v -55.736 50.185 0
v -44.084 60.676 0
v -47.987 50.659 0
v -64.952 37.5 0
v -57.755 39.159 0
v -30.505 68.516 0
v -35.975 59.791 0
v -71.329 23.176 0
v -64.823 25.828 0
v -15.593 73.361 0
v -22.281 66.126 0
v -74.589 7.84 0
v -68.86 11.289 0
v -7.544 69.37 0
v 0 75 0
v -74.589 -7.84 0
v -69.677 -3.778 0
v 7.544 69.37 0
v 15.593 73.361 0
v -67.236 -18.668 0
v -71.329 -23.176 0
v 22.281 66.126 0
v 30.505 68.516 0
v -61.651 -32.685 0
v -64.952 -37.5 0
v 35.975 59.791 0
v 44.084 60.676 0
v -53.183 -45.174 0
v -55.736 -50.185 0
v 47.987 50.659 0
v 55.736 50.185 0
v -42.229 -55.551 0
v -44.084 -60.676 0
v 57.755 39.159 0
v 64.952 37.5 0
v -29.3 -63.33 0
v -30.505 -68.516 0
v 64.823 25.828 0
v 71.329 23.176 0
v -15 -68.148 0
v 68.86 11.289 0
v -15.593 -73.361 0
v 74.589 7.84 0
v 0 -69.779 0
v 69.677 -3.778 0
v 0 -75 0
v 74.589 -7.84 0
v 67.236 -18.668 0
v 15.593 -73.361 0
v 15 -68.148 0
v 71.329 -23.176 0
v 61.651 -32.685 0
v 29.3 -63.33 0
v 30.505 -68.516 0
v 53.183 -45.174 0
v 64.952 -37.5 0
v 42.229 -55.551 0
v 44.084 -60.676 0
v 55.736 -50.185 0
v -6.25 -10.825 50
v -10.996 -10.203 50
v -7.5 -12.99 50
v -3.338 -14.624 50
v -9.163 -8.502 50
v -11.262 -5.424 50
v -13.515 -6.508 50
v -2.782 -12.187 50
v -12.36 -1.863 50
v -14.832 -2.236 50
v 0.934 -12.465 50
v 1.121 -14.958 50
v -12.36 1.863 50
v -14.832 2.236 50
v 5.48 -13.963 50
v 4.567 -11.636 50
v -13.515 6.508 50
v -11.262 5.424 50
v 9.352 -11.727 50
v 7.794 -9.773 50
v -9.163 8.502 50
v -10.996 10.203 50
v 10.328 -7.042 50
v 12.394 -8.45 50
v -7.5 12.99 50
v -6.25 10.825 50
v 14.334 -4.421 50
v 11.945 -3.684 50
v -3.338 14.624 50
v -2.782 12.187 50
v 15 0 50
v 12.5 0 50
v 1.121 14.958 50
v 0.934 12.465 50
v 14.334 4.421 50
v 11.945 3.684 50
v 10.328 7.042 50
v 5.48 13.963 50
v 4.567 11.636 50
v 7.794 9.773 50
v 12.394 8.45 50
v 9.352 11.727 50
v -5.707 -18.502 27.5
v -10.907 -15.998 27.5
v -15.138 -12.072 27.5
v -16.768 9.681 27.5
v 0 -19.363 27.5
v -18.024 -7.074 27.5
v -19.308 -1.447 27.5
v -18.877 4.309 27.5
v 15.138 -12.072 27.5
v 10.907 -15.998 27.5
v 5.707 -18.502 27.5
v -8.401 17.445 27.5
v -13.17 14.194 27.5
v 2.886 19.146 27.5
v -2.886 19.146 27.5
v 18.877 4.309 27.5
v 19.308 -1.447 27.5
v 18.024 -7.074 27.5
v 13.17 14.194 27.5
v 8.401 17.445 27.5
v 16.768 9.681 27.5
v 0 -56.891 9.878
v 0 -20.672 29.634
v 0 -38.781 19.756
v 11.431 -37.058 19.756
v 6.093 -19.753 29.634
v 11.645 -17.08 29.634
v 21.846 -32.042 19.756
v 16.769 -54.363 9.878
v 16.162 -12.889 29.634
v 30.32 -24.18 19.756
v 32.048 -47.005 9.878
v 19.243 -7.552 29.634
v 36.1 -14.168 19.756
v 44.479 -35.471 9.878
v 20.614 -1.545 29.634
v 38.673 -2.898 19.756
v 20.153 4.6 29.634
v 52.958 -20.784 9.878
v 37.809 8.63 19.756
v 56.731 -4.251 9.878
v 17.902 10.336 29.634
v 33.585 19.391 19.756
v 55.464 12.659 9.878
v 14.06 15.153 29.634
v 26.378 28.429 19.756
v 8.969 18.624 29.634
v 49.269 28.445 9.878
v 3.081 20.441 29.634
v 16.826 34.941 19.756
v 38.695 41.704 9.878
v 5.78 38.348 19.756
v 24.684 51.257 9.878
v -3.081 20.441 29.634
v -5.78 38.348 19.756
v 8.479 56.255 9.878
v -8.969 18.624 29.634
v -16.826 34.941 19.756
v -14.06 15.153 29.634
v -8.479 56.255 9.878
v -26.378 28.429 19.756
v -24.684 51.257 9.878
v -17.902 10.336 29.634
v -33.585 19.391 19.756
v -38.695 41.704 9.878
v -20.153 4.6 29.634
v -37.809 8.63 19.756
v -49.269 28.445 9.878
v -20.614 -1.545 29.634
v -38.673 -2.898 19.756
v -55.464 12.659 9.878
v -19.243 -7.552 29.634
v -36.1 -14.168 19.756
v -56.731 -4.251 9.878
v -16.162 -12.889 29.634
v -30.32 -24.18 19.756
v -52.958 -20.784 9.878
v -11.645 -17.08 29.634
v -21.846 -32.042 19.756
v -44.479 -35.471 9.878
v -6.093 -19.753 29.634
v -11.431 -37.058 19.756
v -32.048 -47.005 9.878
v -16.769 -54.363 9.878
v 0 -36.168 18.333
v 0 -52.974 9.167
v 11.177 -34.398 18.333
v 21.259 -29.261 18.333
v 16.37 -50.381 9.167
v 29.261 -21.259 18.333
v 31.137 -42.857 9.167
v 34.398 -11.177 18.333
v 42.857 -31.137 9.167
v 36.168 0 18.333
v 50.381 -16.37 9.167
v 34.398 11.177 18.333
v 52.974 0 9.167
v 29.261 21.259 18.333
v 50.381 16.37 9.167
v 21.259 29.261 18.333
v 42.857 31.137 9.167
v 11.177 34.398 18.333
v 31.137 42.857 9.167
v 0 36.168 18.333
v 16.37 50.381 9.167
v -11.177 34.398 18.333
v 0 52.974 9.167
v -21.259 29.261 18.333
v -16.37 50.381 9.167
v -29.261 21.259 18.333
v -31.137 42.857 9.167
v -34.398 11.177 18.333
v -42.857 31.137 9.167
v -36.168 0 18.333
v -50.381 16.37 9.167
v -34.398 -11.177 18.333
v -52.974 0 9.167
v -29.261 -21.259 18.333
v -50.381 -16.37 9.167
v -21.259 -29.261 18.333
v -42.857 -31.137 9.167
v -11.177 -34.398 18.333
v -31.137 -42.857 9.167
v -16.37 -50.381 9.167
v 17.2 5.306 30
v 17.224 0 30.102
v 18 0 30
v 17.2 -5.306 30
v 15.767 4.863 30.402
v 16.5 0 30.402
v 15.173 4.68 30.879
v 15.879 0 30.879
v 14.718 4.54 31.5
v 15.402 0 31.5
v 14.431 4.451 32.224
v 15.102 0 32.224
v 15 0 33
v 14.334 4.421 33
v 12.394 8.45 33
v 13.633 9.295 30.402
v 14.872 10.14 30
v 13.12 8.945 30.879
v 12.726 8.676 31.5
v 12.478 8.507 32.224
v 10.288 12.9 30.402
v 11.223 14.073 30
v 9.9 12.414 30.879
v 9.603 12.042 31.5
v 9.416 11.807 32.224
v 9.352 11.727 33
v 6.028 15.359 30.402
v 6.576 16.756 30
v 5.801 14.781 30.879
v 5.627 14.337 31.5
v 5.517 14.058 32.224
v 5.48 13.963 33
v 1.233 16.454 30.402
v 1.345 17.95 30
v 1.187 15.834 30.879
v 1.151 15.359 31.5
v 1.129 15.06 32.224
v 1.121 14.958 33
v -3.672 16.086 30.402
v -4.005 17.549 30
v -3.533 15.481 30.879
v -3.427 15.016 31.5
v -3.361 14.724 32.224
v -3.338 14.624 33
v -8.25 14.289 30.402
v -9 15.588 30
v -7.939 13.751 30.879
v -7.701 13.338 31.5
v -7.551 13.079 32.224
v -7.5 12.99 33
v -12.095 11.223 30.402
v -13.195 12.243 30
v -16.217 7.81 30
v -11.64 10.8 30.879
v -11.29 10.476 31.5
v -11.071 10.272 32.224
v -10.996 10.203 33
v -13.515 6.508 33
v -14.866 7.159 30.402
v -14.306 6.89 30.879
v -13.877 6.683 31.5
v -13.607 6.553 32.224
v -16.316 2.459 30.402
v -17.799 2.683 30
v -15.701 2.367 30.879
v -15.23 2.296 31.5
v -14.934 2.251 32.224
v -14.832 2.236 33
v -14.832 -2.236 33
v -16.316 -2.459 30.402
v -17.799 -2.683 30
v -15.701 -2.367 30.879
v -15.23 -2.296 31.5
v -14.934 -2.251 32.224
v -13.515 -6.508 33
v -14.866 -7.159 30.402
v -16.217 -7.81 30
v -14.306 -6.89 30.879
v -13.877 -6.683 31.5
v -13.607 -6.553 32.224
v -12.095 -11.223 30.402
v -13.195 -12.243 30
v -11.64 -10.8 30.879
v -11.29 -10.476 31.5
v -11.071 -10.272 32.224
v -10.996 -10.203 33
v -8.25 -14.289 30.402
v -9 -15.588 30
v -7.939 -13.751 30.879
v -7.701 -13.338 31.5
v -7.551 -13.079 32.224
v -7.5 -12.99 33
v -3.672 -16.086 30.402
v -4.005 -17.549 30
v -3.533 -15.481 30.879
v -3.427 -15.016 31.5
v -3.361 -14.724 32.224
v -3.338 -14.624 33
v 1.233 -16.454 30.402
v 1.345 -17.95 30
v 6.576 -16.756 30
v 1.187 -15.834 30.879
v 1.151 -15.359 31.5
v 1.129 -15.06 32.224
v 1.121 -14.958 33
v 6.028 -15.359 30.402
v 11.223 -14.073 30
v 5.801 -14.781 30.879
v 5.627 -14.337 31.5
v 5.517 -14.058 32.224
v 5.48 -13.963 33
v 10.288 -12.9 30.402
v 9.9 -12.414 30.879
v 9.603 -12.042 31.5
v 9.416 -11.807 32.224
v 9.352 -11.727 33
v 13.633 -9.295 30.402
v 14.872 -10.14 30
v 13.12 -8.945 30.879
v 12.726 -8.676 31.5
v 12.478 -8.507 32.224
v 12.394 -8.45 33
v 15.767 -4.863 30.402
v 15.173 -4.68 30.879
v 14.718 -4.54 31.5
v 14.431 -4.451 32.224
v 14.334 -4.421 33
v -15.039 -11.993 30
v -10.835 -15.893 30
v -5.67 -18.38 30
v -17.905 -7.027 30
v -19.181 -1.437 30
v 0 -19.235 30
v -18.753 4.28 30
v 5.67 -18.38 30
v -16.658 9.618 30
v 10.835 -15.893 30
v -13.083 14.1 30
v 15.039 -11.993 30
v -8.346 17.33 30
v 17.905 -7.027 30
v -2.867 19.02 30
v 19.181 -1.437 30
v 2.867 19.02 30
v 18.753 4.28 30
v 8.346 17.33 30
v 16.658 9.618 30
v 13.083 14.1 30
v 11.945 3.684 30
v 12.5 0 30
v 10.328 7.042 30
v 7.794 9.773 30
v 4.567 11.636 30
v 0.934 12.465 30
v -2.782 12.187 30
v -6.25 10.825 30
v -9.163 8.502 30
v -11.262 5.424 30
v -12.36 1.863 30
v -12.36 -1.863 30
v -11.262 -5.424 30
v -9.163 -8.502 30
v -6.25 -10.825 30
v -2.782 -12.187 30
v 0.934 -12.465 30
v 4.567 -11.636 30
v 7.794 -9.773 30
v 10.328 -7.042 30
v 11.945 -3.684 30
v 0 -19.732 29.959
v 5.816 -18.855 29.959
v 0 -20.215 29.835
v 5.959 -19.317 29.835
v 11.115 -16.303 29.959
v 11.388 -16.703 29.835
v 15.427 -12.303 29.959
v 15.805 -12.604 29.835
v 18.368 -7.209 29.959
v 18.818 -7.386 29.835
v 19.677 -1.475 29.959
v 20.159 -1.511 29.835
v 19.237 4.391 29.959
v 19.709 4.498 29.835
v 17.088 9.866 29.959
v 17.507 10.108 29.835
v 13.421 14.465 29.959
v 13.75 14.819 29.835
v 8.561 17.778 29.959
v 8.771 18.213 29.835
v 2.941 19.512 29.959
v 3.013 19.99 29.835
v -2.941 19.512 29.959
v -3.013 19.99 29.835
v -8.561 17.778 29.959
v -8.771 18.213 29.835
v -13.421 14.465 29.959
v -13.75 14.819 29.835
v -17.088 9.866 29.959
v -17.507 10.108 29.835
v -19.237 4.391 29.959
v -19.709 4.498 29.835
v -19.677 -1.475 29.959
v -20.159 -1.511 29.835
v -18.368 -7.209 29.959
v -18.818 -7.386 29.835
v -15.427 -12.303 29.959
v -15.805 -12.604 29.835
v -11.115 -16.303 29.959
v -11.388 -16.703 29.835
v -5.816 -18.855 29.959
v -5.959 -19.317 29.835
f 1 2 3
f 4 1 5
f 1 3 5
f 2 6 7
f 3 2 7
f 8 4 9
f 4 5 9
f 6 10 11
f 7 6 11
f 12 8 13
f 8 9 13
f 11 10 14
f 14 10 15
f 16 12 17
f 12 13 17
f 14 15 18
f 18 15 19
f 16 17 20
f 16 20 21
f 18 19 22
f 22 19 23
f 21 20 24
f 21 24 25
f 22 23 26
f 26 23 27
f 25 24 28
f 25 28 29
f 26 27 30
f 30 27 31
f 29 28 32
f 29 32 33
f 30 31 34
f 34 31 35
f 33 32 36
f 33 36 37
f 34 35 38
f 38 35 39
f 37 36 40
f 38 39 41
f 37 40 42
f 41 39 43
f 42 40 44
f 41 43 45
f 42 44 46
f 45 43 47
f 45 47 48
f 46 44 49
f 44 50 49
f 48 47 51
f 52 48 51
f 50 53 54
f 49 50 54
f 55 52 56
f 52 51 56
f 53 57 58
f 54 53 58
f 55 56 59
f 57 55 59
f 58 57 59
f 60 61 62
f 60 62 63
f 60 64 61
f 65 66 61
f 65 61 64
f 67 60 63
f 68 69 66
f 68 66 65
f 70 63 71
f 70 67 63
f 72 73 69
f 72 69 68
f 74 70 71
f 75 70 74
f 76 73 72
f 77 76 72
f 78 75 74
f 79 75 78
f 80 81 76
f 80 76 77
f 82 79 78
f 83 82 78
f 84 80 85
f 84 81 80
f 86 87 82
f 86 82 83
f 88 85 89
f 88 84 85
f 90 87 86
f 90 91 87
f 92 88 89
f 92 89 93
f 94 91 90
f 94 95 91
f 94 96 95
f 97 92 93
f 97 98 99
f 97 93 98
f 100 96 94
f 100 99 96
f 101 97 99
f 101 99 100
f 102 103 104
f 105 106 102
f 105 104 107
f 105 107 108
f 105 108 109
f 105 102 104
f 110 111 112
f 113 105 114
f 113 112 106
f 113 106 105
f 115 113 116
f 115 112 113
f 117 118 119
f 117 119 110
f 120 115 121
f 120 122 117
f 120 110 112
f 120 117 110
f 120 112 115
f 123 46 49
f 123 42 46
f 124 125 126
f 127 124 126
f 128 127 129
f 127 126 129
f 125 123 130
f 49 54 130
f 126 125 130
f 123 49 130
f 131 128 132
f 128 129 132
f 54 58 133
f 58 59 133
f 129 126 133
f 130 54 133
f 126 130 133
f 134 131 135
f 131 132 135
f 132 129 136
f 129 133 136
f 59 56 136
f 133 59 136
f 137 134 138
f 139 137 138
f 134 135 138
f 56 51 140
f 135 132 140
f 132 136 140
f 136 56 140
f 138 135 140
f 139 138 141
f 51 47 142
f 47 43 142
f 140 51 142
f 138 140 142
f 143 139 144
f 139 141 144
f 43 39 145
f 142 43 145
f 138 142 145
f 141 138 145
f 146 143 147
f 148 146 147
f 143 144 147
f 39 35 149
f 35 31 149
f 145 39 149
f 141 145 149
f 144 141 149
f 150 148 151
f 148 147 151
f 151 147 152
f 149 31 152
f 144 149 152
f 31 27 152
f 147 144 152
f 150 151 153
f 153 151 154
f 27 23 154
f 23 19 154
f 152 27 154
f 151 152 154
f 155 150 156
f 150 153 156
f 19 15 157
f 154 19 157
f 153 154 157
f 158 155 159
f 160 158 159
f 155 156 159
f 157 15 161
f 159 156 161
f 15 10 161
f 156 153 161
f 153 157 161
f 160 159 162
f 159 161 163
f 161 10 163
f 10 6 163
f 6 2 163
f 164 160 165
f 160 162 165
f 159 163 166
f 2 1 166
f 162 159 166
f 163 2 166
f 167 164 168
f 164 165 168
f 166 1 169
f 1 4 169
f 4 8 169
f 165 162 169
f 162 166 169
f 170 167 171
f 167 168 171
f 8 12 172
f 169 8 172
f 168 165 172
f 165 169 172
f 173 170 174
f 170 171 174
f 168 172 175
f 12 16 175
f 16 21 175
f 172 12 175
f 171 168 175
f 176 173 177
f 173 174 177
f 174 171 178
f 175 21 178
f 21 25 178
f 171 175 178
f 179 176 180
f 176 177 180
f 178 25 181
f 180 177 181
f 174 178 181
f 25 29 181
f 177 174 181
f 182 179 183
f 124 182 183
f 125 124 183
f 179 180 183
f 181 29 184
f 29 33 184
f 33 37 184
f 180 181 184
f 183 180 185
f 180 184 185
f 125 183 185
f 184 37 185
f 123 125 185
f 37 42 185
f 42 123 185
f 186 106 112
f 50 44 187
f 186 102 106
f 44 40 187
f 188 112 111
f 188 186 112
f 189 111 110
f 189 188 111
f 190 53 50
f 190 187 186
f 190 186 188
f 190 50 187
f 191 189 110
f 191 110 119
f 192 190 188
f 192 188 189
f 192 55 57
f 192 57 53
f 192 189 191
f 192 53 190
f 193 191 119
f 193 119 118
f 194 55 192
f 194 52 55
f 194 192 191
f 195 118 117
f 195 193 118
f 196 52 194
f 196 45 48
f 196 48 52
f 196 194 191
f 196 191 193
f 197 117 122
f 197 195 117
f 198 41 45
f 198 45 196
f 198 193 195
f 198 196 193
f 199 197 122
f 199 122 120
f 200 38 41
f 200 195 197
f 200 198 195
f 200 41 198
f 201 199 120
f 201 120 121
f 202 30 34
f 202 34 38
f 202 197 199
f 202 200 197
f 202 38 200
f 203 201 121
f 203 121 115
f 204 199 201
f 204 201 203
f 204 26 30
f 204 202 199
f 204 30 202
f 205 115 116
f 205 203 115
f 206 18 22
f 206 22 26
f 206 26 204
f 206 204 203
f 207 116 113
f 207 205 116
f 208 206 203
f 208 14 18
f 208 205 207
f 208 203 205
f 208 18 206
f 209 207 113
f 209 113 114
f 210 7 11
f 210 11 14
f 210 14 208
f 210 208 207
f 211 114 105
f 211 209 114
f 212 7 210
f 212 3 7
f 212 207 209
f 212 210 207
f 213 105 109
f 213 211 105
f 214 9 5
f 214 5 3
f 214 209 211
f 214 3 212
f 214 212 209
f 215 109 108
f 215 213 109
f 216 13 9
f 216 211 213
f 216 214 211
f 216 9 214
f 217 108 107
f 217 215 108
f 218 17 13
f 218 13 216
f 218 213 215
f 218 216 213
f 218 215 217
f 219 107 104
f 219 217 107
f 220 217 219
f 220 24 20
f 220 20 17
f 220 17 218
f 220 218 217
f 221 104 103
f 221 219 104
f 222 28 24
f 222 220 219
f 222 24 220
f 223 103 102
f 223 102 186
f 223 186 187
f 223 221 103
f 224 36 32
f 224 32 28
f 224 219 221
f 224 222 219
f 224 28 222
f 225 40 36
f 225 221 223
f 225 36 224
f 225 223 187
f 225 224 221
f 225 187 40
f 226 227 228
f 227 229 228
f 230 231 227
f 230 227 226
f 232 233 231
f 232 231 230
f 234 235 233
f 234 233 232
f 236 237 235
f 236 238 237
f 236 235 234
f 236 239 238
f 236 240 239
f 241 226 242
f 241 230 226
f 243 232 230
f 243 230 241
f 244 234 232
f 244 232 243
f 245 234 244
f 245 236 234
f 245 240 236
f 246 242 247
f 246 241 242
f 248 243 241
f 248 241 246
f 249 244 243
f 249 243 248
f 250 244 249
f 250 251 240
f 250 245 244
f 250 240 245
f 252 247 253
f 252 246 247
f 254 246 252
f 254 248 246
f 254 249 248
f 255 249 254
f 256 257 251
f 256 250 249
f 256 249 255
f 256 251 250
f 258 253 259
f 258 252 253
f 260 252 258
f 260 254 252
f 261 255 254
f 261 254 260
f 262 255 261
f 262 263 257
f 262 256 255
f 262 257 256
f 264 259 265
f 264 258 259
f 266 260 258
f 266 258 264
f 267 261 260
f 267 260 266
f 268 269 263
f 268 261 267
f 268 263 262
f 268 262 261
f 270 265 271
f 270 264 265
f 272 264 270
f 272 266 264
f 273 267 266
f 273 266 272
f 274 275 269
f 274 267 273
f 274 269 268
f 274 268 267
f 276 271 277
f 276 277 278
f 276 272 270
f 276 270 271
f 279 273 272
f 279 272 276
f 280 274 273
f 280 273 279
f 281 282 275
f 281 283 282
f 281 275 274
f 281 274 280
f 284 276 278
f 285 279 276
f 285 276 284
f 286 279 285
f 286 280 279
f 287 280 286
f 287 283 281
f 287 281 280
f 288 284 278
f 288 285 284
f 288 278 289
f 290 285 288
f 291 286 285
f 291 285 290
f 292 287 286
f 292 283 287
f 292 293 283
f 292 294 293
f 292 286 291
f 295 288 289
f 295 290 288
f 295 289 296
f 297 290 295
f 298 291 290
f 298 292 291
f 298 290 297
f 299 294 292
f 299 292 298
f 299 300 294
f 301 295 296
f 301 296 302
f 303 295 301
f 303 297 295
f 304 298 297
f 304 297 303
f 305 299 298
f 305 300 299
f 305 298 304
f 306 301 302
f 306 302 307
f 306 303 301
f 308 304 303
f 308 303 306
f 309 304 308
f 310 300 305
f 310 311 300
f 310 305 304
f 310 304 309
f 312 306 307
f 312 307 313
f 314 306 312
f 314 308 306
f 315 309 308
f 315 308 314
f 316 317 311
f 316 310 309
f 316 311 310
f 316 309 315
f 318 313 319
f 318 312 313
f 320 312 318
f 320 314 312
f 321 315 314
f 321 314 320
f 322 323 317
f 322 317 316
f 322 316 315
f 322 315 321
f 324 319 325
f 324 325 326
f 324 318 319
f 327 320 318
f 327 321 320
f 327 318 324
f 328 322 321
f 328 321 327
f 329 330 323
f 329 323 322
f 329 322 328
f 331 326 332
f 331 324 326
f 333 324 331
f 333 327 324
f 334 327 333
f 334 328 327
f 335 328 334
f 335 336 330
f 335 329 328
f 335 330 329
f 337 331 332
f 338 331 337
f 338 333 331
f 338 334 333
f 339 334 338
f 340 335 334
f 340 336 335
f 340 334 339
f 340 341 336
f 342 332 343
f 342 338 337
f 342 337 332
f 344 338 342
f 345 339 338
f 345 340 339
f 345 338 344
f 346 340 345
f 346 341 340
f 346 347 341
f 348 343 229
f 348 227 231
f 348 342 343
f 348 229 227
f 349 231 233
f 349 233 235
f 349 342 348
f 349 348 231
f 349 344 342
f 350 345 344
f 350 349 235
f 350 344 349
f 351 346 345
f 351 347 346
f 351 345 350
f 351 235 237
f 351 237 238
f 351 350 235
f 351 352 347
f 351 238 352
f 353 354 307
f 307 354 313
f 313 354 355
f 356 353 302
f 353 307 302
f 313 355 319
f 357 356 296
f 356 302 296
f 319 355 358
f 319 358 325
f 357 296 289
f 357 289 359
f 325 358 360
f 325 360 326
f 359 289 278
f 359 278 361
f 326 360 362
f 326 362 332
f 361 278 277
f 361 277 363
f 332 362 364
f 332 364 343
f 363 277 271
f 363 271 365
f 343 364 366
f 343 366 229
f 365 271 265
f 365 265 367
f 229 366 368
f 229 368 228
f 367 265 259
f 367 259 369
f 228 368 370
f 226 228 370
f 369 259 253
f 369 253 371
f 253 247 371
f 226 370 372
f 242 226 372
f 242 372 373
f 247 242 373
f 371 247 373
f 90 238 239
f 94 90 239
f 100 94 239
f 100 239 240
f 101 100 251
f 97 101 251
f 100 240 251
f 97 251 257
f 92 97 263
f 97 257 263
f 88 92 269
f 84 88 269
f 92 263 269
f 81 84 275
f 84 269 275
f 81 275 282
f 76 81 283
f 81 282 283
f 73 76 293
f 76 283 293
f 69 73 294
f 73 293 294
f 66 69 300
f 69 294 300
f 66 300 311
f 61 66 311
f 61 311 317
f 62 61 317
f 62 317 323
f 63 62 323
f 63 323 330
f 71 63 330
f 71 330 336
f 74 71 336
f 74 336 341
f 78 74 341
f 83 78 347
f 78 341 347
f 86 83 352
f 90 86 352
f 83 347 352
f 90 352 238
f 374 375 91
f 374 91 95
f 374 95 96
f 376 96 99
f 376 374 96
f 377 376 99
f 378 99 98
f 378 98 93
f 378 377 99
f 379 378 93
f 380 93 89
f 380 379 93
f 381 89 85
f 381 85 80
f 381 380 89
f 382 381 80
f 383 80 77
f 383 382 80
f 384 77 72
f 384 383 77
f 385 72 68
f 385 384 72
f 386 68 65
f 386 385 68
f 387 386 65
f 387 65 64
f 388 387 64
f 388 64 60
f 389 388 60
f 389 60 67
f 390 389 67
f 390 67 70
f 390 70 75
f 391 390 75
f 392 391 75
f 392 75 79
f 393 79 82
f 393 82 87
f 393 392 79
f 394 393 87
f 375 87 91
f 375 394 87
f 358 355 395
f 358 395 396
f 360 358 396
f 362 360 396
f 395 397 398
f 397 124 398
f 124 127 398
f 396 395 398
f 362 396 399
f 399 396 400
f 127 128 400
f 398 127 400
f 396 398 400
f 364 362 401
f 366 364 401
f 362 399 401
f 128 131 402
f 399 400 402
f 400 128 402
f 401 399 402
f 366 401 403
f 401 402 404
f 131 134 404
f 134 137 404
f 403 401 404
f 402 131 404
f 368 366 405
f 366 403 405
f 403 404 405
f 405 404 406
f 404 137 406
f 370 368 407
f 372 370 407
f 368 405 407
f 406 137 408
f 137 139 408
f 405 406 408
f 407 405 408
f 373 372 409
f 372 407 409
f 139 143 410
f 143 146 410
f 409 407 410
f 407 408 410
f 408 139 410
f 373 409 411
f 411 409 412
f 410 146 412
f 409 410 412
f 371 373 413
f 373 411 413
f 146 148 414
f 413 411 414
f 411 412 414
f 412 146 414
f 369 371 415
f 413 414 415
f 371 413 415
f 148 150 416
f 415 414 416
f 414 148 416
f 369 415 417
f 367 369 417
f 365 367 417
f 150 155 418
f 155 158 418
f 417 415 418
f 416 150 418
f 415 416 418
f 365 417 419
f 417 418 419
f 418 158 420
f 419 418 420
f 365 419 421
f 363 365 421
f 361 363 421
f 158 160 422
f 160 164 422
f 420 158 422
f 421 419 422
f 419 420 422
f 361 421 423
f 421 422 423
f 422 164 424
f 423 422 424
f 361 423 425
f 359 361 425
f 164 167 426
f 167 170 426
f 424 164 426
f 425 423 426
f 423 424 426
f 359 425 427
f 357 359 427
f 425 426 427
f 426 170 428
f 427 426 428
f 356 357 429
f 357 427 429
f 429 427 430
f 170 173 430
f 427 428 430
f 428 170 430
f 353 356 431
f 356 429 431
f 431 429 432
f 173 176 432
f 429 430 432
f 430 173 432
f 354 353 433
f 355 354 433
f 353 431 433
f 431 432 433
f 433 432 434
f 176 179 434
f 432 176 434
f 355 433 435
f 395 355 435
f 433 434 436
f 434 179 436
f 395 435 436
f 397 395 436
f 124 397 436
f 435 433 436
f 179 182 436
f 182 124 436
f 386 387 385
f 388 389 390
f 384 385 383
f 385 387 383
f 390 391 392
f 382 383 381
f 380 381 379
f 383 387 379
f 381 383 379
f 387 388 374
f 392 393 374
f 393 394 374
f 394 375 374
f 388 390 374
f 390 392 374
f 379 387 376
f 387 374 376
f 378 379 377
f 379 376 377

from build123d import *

# Parameters (mm, degrees)
F3_T     = -2.5
F4_R     = 15
F4_R_2   = 12.5
F5_DEPTH = 20
F6_R     = 3


with BuildPart() as f1:
    # F0 (on Right) → F1 (revolve)
    with BuildSketch(Plane.YZ):
        Polygon((0, 0), (0, 30), (-20, 30), (-75, 0), align=None)
    revolve(axis=Axis((0, 0, 15), (0, 0, 1)))

    # F3
    f3_openings = [f1.faces().sort_by_distance(p)[0] for p in [
        (0, 0, 0),
    ]]
    offset(amount=F3_T, openings=f3_openings)

    # F4 (on face) → F5 (join)
    with BuildSketch(Plane.XY.offset(30)):
        Circle(F4_R)
        Circle(F4_R_2, mode=Mode.SUBTRACT)
    extrude(amount=F5_DEPTH)

    # F6
    f6_edges = [f1.edges().sort_by_distance(p)[0] for p in [
        (0, 20, 30),
        (-15, 0, 30),
    ]]
    fillet(f6_edges, radius=F6_R)


solid = f1.part
